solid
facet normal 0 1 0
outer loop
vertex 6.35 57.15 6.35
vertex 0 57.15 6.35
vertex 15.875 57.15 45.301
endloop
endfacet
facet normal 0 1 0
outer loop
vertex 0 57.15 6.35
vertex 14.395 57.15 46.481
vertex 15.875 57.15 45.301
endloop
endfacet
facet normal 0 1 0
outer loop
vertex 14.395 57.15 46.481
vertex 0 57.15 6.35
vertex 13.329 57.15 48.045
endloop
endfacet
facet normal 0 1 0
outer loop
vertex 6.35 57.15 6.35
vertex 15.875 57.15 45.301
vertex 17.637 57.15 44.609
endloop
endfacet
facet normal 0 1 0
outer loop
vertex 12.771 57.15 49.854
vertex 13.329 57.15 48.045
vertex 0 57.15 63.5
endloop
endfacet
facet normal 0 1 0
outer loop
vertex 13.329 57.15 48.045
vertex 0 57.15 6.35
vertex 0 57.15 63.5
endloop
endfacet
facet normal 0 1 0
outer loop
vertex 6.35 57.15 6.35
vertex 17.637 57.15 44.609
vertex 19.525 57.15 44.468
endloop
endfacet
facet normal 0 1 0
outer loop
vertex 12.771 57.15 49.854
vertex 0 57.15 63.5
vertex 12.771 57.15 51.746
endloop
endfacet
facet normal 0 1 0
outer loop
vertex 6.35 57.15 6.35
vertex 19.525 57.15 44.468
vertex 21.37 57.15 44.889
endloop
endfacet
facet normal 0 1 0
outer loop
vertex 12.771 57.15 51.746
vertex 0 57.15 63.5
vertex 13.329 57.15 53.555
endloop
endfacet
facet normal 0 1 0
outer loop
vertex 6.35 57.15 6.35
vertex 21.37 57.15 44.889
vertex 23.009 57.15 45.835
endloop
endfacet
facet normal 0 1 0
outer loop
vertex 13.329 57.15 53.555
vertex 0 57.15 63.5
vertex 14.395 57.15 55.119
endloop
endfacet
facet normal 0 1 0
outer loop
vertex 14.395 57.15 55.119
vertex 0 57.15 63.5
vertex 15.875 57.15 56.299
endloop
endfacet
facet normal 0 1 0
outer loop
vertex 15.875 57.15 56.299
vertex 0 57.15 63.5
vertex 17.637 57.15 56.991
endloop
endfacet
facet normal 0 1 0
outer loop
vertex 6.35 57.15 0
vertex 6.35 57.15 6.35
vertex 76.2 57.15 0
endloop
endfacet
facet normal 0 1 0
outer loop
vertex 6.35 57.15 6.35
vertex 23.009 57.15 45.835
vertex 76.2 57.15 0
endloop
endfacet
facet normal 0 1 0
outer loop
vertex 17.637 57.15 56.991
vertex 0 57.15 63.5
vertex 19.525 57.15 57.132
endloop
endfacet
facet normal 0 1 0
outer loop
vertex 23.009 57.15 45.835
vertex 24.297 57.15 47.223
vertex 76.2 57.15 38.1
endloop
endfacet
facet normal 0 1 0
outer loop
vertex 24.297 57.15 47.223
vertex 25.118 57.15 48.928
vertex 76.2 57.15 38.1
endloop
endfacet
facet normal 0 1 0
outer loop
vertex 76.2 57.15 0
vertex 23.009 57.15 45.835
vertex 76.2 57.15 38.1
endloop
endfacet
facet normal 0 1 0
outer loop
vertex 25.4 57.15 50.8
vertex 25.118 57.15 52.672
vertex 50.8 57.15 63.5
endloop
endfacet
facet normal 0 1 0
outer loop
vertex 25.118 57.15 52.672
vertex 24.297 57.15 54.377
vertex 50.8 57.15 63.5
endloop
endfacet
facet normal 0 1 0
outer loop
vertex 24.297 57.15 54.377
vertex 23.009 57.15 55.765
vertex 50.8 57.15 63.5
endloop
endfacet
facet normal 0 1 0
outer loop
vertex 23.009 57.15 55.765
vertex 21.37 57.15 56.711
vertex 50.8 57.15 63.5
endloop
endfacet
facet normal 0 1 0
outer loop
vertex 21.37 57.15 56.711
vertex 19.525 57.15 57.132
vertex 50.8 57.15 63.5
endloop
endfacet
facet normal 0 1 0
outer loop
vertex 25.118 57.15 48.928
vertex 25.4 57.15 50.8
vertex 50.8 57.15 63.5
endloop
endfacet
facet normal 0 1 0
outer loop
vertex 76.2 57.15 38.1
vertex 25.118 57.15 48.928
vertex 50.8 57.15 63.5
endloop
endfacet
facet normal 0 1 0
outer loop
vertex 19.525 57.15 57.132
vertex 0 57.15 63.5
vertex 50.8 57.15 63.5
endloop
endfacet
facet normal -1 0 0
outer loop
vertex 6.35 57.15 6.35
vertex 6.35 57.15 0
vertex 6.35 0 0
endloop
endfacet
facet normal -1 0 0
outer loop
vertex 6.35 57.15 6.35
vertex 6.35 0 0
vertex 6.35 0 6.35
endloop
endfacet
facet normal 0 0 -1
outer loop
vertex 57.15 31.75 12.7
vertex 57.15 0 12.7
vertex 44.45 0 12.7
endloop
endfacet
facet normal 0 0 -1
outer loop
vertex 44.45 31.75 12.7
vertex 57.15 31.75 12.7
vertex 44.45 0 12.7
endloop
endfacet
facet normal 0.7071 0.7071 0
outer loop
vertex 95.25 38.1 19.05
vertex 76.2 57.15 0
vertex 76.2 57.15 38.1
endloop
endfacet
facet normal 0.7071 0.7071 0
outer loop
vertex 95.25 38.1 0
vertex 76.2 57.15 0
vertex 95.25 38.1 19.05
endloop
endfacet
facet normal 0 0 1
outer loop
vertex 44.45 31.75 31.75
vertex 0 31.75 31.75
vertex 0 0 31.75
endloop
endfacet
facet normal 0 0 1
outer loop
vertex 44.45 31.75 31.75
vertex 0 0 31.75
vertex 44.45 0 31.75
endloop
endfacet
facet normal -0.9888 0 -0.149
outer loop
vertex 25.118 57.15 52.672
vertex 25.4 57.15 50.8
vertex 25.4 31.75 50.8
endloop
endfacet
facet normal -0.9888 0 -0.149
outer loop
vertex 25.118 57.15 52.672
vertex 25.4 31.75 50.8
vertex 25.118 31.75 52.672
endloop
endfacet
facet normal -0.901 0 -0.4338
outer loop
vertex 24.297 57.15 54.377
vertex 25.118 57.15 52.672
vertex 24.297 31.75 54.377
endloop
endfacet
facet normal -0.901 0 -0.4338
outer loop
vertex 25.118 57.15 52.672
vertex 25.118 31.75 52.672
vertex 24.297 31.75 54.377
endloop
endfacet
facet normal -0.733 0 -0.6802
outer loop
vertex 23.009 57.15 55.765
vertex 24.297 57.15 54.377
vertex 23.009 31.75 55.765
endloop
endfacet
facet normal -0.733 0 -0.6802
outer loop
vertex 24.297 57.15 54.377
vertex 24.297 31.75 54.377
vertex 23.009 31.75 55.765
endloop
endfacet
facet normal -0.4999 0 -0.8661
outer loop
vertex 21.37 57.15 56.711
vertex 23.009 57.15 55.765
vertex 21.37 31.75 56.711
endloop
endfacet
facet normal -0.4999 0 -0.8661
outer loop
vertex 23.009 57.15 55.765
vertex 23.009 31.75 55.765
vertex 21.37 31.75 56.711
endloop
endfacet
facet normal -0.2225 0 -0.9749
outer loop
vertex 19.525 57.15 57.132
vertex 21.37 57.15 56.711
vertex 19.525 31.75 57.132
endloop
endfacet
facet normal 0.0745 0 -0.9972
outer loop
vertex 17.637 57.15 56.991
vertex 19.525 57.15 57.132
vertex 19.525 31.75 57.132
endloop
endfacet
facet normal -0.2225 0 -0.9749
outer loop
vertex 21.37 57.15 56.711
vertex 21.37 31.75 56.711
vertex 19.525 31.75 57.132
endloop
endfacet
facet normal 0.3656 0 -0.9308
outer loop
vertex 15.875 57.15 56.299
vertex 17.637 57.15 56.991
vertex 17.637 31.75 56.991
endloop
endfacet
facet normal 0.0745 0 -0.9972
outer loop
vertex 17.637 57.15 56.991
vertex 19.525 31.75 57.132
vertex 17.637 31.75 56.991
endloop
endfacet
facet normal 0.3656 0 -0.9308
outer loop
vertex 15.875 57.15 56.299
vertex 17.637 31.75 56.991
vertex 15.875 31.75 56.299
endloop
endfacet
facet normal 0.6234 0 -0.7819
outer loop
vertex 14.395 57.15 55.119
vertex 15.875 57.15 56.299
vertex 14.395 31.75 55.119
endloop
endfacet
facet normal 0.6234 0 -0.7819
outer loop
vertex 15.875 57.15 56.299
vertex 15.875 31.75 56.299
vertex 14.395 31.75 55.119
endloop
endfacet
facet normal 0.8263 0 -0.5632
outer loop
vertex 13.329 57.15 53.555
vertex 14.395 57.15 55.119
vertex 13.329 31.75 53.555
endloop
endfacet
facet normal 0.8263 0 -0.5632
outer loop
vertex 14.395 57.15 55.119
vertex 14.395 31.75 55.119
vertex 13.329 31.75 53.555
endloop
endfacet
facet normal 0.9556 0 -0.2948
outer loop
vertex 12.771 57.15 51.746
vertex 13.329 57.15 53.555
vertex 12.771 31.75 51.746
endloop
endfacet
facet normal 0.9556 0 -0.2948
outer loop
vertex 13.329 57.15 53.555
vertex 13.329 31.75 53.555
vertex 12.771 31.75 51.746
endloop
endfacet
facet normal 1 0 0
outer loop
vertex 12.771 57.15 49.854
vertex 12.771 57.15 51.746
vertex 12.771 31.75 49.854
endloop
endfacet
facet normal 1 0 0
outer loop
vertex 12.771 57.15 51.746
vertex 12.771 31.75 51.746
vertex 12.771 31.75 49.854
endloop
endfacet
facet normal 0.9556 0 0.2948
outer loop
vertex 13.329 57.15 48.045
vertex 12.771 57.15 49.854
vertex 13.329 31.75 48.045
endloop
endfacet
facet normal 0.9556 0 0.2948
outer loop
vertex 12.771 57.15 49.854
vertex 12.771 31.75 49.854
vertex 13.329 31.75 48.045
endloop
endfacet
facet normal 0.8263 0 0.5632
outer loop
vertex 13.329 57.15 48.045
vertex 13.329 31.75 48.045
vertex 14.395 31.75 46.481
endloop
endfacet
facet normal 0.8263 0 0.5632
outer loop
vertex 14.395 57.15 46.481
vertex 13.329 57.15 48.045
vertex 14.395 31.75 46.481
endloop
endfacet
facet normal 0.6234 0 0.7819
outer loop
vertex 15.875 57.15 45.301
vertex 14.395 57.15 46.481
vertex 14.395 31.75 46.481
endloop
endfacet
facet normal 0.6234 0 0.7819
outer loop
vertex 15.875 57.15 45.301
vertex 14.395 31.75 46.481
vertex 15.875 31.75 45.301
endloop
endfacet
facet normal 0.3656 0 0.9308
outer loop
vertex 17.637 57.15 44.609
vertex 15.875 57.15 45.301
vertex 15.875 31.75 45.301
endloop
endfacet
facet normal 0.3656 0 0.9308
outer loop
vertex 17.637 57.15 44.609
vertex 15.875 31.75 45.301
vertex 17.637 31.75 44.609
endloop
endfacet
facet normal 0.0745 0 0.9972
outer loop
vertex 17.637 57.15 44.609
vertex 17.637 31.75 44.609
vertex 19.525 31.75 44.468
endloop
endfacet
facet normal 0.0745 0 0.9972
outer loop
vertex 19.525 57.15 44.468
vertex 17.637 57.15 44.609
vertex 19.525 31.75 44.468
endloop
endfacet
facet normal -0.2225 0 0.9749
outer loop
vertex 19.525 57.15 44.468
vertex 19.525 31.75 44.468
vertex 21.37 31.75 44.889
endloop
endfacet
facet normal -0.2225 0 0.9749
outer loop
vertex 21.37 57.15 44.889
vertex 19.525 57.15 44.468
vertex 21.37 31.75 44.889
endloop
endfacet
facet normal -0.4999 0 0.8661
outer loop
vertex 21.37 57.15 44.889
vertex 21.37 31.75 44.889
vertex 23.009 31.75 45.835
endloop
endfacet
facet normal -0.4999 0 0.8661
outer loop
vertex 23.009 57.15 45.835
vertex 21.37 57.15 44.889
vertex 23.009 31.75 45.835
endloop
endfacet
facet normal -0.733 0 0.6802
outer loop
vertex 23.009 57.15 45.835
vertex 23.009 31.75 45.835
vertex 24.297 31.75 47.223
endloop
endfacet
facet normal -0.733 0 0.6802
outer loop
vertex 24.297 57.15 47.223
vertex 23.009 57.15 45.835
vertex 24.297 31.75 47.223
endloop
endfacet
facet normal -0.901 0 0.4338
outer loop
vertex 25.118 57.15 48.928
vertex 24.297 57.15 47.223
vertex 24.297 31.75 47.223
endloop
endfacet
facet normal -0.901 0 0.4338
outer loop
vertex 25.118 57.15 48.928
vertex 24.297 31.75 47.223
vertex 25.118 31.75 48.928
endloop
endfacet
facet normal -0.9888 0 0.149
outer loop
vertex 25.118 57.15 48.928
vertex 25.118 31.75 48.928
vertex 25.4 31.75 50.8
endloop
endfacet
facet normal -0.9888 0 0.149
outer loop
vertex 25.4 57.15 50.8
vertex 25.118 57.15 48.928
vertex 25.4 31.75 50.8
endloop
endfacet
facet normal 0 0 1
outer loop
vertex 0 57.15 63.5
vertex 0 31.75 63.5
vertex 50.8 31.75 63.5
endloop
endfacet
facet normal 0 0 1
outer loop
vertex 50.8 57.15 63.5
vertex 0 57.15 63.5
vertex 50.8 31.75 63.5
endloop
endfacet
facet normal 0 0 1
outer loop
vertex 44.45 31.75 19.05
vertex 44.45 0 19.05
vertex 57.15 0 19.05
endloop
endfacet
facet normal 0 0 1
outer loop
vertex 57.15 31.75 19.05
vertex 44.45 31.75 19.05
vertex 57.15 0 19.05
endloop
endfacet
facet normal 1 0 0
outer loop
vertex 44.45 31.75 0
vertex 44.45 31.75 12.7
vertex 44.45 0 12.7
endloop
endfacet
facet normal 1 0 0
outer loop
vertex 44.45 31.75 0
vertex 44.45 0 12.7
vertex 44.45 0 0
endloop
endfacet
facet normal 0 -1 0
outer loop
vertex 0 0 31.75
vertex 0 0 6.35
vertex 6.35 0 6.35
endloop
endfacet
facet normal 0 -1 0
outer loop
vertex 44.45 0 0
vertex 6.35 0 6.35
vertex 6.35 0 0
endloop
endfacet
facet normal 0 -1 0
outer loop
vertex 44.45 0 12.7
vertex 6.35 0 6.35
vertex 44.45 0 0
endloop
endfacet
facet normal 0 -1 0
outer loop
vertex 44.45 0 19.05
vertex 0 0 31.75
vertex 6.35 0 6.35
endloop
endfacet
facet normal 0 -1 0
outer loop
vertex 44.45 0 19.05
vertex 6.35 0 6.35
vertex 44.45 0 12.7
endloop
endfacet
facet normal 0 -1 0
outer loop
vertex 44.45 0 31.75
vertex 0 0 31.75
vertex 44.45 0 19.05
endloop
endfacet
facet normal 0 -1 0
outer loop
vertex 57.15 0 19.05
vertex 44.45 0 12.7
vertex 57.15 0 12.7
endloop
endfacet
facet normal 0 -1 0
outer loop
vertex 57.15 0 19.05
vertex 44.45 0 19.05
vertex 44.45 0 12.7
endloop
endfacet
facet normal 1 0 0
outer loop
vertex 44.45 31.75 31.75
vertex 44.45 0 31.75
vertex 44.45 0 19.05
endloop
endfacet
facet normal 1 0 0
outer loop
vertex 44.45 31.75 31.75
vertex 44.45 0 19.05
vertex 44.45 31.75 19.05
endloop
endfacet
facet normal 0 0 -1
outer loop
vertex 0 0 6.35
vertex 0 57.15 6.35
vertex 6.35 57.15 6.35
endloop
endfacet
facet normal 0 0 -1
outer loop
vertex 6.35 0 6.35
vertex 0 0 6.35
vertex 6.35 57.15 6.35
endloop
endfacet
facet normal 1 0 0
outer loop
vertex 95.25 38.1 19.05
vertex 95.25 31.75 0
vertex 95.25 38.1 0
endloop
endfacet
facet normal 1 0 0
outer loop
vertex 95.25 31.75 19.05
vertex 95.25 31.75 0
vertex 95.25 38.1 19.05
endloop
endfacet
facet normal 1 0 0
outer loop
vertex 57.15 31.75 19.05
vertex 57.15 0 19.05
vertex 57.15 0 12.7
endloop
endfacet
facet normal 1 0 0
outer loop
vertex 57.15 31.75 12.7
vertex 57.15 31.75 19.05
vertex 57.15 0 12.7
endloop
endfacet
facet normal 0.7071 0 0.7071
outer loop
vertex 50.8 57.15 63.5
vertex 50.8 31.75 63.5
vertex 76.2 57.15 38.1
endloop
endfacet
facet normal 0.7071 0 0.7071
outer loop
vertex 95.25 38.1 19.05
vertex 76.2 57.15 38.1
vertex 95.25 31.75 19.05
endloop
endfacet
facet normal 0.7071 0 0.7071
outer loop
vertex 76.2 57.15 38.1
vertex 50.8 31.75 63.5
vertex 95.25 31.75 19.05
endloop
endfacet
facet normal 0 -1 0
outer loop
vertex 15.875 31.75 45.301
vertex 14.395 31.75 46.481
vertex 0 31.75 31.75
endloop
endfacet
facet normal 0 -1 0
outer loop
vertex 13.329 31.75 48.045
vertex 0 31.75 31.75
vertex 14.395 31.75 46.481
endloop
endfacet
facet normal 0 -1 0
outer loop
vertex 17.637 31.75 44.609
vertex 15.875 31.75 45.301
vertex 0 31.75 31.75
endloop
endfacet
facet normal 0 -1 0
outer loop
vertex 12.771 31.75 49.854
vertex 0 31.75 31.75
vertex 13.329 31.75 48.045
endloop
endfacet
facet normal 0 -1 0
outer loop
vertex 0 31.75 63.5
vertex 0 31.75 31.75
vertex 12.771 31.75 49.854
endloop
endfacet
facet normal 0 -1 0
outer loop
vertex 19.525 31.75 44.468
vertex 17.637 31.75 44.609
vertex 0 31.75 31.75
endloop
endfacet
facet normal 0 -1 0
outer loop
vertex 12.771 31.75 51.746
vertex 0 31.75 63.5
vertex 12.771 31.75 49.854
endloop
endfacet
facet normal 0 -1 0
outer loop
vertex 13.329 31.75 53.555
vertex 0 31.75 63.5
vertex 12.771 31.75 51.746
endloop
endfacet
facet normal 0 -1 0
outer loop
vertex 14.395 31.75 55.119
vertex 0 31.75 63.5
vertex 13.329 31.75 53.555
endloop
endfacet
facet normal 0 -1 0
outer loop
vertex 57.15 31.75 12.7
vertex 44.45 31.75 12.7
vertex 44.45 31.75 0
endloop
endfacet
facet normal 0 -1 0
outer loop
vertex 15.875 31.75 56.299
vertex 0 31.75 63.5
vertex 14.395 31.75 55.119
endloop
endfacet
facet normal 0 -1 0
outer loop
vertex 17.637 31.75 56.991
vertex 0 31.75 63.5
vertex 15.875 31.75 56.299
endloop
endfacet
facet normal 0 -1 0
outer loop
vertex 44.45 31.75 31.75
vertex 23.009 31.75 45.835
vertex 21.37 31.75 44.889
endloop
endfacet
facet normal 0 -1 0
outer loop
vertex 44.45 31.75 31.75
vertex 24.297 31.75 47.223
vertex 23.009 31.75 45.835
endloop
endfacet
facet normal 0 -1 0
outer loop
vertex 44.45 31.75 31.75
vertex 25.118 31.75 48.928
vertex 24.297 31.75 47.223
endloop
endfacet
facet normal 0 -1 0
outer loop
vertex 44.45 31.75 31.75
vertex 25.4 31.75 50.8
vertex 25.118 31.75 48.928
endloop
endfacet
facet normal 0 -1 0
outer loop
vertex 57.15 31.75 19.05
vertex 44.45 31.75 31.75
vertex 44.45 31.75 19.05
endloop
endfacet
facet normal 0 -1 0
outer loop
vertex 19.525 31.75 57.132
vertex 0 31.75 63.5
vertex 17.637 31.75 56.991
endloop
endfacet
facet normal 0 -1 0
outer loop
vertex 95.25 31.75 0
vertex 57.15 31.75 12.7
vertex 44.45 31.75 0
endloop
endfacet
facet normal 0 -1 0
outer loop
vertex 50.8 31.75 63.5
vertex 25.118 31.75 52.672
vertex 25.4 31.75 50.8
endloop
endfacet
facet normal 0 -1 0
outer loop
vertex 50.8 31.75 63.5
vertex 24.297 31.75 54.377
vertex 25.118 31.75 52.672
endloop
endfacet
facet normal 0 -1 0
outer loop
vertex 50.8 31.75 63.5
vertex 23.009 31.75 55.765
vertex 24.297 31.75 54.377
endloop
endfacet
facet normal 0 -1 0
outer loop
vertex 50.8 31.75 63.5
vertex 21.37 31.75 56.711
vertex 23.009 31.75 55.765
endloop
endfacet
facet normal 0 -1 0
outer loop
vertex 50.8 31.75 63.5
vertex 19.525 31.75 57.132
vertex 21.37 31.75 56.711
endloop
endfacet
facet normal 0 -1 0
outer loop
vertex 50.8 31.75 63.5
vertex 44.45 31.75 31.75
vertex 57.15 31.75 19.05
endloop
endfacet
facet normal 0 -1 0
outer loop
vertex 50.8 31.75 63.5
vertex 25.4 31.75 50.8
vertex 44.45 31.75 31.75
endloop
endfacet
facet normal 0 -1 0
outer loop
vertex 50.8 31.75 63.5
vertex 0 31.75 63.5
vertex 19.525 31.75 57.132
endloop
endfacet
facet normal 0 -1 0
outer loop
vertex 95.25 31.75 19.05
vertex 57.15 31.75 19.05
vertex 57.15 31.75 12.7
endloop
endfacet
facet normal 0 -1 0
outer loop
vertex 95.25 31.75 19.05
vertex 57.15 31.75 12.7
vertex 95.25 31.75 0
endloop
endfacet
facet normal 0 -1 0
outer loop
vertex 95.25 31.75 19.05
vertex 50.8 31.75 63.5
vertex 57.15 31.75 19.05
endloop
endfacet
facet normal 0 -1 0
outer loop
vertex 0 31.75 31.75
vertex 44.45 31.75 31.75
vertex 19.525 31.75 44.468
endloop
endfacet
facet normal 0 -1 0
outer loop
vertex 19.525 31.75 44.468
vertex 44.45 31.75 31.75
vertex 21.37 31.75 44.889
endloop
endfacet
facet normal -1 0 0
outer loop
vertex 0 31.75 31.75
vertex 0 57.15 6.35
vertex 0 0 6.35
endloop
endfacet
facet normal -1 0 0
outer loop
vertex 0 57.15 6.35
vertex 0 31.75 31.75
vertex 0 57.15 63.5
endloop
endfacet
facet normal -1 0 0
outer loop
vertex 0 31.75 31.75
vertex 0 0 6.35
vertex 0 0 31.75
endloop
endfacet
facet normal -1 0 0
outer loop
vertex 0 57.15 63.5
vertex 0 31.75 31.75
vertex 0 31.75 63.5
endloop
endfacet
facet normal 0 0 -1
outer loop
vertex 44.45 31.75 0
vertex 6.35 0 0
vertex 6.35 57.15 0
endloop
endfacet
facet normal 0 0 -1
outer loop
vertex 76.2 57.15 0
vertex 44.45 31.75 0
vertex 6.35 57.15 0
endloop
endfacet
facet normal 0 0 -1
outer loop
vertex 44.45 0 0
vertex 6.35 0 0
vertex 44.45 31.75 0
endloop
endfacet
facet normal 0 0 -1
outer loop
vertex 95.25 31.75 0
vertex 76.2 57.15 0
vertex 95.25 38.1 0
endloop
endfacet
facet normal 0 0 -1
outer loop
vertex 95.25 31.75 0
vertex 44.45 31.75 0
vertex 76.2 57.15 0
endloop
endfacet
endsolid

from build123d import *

# Parameters (mm, degrees)
F0_W      = 107.95
F0_H      = 63.5
F1_DEPTH  = 57.15
F2_W      = 44.45
F2_H      = 31.75
F3_DEPTH  = 31.75
F4_W      = 63.5
F4_H      = 31.75
F5_DEPTH  = 44.45
F6_W      = 6.35
F6_H      = 6.35
F7_DEPTH  = 57.151
F9_DEPTH  = 31.75
F10_W     = 12.7
F10_H     = 63.5
F11_DEPTH = 25.4
F13_DEPTH = 25.401
F14_R     = 6.35
F15_DEPTH = 25.401
F17_DEPTH = 63.501


with BuildPart() as f1:
    # F0 (on Front) → F1 (new body)
    with BuildSketch(Plane.XZ):
        with Locations((53.975, 31.75)):
            Rectangle(F0_W, F0_H)
    extrude(amount=-F1_DEPTH)

    # F2 (on face) → F3 (cut)
    with BuildSketch(Plane.XY.offset(63.5)):
        with Locations((22.225, 15.875)):
            Rectangle(F2_W, F2_H)
    extrude(amount=-F3_DEPTH, mode=Mode.SUBTRACT)

    # F4 (on face) → F5 (cut)
    with BuildSketch(Plane.XY.offset(63.5)):
        with Locations((76.2, 15.875)):
            Rectangle(F4_W, F4_H)
    extrude(amount=-F5_DEPTH, mode=Mode.SUBTRACT)

    # F6 (on Front) → F7 (cut, through all)
    with BuildSketch(Plane.XZ):
        with Locations((3.175, 3.175)):
            Rectangle(F6_W, F6_H)
    extrude(amount=-F7_DEPTH, mode=Mode.SUBTRACT)

    # F8 (on face) → F9 (cut)
    with BuildSketch(Plane.XZ):
        Polygon((44.45, 12.7), (44.45, 0), (107.95, 0), (107.95, 19.05), (57.15, 19.05), (57.15, 12.7), align=None)
    extrude(amount=-F9_DEPTH, mode=Mode.SUBTRACT)

    # F10 (on face) → F11 (cut)
    with BuildSketch(Plane.XZ.offset(-31.75)):
        with Locations((101.6, 31.75)):
            Rectangle(F10_W, F10_H)
    extrude(amount=-F11_DEPTH, mode=Mode.SUBTRACT)

    # F12 (on face) → F13 (cut, through all)
    with BuildSketch(Plane.XZ.offset(-31.75)):
        Polygon((95.25, 63.5), (50.8, 63.5), (95.25, 19.05), align=None)
    extrude(amount=-F13_DEPTH, mode=Mode.SUBTRACT)

    # F14 (on face) → F15 (cut, through all)
    with BuildSketch(Plane.XZ.offset(-31.75)):
        with Locations((19.05, 50.8)):
            Circle(F14_R)
    extrude(amount=-F15_DEPTH, mode=Mode.SUBTRACT)

    # F16 (on Top) → F17 (cut, through all)
    with BuildSketch(Plane.XY):
        Polygon((95.25, 38.1), (95.25, 57.15), (76.2, 57.15), align=None)
    extrude(amount=F17_DEPTH, mode=Mode.SUBTRACT)


solid = f1.part
